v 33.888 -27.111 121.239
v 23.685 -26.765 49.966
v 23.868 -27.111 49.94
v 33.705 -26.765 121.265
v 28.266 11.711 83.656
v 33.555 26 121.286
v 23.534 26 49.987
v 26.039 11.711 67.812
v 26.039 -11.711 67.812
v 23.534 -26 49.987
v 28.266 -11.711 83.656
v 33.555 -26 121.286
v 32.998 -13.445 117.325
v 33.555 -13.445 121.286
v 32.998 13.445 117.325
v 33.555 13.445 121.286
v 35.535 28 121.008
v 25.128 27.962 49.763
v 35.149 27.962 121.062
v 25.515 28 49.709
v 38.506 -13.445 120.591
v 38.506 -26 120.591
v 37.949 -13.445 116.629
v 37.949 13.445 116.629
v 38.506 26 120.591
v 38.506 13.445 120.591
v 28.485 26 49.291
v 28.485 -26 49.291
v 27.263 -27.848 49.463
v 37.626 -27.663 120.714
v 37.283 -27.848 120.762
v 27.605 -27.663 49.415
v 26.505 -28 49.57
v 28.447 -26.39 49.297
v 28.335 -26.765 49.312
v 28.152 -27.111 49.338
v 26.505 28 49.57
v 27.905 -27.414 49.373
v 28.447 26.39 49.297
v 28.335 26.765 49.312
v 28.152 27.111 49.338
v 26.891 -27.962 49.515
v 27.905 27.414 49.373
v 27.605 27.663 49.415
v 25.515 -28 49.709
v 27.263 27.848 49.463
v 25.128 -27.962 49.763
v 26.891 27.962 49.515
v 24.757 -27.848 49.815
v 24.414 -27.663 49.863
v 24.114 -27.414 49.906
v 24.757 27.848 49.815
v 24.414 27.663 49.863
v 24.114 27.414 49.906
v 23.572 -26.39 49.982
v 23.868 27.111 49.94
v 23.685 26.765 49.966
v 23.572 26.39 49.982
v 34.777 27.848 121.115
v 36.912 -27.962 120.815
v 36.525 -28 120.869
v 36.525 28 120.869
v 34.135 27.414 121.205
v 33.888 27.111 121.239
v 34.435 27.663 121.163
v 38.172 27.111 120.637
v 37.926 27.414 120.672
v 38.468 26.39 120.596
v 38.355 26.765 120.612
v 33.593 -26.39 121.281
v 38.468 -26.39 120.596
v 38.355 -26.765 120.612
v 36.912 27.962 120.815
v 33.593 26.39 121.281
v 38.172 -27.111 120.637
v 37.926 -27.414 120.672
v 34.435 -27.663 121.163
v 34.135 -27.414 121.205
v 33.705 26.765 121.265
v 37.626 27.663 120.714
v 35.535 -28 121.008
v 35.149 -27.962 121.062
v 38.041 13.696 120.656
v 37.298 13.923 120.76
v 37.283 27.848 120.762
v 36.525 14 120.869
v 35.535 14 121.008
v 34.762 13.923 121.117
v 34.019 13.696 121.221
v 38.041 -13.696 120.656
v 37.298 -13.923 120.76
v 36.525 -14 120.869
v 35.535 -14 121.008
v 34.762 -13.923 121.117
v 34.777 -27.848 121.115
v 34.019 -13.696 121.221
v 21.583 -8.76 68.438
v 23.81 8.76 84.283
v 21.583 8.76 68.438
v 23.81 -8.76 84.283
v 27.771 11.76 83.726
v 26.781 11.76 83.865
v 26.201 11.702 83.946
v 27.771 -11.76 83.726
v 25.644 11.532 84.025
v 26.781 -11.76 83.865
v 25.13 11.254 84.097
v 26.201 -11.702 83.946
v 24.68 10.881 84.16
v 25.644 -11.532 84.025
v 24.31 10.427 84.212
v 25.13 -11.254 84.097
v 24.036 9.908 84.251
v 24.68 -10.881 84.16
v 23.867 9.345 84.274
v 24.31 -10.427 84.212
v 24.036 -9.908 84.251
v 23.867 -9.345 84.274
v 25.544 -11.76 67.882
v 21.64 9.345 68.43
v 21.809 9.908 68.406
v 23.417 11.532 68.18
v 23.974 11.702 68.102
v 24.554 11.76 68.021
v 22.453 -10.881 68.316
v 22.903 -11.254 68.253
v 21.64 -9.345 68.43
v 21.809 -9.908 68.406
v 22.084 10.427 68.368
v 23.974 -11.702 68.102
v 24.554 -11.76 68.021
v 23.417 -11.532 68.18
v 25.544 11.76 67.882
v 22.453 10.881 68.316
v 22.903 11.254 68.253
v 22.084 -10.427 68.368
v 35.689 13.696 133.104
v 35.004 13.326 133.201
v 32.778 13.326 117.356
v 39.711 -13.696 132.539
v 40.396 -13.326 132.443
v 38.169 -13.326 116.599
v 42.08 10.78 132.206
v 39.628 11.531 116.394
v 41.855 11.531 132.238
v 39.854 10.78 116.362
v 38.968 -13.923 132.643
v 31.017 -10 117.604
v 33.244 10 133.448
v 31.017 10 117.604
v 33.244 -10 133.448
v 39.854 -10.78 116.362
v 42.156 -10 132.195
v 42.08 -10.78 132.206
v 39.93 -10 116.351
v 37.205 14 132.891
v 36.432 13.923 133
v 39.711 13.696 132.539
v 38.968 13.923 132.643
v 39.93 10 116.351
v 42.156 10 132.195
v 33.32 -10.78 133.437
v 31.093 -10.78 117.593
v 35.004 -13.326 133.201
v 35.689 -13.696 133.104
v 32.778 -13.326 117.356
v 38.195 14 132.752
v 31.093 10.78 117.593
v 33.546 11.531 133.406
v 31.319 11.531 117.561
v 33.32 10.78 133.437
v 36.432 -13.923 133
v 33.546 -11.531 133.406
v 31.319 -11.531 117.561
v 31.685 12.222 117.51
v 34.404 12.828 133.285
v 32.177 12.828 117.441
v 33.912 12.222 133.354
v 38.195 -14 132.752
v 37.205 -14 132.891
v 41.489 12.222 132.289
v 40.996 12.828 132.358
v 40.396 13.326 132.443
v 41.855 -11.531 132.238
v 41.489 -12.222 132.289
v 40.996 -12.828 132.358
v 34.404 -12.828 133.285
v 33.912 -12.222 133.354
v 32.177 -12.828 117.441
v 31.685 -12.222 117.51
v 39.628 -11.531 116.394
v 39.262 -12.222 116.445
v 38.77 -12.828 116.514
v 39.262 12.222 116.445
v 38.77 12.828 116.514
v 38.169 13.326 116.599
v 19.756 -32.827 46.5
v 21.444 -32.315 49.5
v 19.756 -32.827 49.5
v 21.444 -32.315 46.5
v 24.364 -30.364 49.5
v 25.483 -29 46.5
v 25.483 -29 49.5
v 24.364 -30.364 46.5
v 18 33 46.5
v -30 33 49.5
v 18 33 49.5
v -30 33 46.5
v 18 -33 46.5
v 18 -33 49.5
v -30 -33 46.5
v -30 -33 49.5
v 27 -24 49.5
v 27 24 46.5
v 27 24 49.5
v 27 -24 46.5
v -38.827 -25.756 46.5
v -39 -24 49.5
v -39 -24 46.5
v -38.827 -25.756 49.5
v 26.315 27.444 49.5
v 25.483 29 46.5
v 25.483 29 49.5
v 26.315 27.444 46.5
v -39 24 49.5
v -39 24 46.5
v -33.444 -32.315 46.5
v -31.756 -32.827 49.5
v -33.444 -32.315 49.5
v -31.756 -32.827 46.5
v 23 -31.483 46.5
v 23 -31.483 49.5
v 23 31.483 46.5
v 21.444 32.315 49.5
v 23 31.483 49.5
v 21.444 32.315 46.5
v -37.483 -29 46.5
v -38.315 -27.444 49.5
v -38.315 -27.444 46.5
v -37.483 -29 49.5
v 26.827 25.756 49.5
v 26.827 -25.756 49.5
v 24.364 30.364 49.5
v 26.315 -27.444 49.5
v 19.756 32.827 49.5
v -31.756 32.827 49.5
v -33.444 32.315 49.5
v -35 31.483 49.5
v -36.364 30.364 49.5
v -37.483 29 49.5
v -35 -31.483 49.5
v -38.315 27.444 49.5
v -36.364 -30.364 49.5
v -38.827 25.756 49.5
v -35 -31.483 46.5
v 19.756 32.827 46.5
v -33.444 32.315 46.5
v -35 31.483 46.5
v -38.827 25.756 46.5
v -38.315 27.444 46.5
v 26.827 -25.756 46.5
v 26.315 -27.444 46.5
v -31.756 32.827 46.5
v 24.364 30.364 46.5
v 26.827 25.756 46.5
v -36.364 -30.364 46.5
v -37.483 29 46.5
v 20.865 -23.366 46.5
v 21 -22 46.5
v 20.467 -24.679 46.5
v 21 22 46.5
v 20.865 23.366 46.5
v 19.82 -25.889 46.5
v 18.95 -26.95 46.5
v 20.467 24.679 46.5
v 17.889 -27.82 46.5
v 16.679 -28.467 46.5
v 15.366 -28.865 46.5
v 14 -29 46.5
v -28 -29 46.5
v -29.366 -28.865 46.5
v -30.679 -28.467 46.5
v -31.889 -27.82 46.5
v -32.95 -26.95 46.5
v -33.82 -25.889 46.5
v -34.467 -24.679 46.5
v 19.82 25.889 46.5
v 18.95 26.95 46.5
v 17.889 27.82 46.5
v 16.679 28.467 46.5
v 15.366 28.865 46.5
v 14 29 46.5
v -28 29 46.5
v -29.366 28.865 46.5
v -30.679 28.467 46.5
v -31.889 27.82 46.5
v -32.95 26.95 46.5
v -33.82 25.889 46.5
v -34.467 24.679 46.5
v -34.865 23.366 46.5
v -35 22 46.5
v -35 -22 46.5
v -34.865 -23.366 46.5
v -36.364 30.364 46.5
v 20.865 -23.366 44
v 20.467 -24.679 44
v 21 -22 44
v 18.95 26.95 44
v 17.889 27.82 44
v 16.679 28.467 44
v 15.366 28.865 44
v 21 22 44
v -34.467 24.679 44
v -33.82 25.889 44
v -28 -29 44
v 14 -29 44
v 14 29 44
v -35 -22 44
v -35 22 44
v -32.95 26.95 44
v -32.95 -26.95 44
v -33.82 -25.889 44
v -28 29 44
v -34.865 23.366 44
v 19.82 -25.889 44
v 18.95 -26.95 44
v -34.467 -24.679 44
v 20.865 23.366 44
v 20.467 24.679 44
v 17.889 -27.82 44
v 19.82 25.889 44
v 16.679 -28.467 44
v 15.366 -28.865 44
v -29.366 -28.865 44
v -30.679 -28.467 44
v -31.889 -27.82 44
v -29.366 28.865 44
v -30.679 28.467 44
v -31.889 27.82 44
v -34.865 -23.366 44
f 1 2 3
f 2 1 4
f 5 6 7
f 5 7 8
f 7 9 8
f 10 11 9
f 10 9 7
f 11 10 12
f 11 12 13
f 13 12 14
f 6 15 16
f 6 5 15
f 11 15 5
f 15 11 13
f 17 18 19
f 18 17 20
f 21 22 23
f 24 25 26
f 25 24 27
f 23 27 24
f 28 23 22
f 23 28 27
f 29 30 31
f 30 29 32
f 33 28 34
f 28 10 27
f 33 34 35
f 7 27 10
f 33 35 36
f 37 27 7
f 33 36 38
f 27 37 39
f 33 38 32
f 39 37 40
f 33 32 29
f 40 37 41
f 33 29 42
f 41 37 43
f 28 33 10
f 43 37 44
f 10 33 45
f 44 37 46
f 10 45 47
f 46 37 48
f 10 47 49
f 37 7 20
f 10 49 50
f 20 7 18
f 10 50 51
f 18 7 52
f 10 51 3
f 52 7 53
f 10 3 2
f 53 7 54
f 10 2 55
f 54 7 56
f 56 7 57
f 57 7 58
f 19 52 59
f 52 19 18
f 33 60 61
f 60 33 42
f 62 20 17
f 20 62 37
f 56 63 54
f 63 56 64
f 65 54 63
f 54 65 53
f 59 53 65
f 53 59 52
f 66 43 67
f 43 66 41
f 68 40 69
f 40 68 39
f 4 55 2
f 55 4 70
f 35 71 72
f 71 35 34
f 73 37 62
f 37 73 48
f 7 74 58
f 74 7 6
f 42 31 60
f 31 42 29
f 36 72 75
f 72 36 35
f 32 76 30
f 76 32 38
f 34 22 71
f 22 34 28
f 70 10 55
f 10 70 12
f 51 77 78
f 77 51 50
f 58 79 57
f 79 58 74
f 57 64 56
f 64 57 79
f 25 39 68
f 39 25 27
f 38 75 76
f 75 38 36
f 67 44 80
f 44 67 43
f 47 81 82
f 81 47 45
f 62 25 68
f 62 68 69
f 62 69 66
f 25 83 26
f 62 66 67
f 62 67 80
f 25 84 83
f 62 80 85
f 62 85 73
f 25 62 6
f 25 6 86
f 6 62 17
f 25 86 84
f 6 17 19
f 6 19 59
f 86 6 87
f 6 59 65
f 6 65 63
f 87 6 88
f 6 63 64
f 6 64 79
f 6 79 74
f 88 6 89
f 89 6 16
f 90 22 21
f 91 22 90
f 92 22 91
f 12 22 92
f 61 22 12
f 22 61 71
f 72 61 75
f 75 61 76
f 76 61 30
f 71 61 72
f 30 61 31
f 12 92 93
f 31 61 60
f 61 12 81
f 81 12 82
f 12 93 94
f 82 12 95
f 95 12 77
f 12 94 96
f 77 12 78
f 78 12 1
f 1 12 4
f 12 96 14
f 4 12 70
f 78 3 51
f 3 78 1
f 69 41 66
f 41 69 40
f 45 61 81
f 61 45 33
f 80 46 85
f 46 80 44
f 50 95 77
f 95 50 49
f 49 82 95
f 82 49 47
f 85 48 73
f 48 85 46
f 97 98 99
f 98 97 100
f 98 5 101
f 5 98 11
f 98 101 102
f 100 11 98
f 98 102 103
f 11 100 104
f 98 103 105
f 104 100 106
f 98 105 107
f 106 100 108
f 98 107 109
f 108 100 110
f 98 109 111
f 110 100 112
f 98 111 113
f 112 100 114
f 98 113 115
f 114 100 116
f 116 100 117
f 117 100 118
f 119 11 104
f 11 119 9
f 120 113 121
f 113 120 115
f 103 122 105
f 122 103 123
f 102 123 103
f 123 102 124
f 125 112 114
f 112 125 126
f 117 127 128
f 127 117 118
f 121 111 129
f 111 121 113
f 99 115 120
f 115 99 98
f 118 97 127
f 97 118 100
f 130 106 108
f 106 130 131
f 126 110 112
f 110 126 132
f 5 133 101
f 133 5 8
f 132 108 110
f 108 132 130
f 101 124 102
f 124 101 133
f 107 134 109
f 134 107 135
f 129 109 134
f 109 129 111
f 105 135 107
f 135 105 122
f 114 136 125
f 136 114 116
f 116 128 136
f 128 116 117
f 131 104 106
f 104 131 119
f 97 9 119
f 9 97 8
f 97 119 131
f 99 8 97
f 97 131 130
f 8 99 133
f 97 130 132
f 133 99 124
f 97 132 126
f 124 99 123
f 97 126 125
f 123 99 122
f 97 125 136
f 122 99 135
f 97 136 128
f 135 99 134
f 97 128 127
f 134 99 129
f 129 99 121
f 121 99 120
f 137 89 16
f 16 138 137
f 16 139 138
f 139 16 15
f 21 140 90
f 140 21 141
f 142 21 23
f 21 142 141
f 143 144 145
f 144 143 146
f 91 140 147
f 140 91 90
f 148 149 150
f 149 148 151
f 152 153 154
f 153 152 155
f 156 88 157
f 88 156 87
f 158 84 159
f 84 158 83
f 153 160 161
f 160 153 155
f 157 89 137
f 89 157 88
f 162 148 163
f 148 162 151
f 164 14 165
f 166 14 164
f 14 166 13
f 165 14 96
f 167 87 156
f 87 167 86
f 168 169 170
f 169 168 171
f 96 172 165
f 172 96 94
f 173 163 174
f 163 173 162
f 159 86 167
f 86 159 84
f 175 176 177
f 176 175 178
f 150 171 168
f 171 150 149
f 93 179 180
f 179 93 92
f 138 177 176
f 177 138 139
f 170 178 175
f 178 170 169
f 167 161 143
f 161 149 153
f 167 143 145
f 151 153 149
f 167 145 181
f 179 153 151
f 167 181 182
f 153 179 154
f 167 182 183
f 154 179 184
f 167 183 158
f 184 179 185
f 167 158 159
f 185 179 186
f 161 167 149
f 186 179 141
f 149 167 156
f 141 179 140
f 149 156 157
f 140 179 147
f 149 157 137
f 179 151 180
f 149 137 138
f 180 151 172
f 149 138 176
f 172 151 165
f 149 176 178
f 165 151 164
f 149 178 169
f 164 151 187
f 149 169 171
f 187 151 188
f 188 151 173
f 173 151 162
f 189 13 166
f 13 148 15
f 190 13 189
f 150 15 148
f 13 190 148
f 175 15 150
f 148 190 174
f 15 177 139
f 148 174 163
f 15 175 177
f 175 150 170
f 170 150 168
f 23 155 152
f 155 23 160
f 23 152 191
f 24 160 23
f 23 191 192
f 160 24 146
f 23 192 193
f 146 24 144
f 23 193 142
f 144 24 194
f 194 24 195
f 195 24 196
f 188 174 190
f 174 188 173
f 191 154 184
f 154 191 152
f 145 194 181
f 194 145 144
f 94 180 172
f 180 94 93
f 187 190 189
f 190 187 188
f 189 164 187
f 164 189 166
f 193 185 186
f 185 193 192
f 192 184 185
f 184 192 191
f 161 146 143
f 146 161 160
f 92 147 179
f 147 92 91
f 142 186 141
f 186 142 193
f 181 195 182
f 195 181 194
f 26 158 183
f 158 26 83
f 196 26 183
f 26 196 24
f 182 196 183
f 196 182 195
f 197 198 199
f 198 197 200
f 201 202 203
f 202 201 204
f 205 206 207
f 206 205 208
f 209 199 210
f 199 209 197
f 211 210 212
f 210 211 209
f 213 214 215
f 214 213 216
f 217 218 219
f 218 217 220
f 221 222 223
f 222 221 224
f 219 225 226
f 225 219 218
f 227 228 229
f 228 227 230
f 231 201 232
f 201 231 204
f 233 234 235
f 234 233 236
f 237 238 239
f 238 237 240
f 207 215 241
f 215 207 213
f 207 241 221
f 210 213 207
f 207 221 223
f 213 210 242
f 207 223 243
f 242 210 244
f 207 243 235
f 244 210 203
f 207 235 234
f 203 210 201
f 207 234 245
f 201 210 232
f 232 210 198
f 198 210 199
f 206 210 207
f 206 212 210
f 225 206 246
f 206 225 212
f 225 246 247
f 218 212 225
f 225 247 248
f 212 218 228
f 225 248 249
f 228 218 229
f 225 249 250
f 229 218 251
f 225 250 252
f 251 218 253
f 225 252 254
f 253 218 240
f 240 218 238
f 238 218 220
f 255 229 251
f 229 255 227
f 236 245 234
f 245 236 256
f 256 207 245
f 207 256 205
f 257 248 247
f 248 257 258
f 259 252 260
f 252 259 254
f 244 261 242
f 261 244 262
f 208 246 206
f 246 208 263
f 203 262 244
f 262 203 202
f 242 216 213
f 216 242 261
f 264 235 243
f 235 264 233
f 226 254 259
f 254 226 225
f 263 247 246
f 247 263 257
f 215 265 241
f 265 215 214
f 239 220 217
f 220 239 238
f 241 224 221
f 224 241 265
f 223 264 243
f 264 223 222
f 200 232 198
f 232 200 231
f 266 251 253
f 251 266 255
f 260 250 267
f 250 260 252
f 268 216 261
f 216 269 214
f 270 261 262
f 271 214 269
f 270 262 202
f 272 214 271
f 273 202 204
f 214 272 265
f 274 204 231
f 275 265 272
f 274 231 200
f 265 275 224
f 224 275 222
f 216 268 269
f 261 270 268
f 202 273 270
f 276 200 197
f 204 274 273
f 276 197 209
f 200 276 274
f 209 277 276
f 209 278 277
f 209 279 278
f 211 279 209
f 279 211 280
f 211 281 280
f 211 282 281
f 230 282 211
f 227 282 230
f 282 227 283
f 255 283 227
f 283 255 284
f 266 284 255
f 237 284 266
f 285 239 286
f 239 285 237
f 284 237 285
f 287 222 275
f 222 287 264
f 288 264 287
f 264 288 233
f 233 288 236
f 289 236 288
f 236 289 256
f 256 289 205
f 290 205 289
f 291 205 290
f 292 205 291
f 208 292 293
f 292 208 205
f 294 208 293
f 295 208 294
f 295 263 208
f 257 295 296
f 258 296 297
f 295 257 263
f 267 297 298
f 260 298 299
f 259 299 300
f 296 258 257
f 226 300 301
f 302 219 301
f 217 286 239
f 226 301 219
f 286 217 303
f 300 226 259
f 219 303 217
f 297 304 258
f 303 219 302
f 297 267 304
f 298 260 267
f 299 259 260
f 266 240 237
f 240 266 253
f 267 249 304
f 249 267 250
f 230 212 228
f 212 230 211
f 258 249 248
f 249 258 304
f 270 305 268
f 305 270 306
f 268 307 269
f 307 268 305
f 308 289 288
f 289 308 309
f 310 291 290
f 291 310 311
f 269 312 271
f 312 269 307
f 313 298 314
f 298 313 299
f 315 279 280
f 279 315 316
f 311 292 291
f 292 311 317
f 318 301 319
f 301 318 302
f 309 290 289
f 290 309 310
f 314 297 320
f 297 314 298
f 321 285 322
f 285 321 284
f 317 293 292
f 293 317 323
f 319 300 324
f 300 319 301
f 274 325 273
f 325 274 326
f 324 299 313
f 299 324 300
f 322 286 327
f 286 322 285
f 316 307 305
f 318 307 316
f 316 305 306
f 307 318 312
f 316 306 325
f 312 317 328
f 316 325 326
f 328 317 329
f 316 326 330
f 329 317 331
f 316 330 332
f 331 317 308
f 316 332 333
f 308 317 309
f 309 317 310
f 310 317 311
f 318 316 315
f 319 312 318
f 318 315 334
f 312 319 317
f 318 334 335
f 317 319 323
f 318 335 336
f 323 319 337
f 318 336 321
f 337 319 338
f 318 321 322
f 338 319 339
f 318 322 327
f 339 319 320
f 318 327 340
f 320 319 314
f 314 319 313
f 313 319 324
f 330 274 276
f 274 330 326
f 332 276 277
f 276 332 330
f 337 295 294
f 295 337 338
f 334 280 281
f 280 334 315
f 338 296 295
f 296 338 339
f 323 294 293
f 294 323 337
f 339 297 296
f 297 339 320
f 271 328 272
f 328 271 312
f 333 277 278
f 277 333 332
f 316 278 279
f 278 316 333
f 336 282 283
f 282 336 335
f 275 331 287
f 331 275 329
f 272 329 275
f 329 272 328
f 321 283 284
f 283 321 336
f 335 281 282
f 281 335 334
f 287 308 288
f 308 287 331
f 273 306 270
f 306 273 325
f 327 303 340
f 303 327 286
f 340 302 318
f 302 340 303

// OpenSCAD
// file: utils.scad
include <parameters.scad>

module beamBetween(p1, p2, width, height) {
    dx = p2[0] - p1[0];
    dz = p2[2] - p1[2];
    length = sqrt(dx * dx + dz * dz);
    angle = atan2(dz, dx);

    translate([(p1[0] + p2[0]) / 2, (p1[1] + p2[1]) / 2, (p1[2] + p2[2]) / 2])
        rotate([0, -angle, 0])
            cube([length, width, height], center = true);
}
// file: seat.scad
include <parameters.scad>
use <utils.scad>

//================ SEAT SUPPORT FRAME (L-BRACKETS) =================//
// Two L-brackets carry the seat. Each one sits on the cross-bar that
// joins the two back drive sprockets. Aluminum construction.
// Suspension beams mount to the outboard side of each bracket riser.

module seatBracket(y, w = 6) {
    panB = idlerZ + seatTopOffset - 5;   // pan bottom
    barX = idlerX;                        // the drive cross-track bar (back sprockets)
    barZ = idlerZ;                        // bar height = sprocket axle height

    // Foot that clamps around the cross-track bar (wraps the axle).
    // Pinch bolt secures the clamp.
    color(matDarkSteel)
        translate([barX, y, barZ])
            rotate([90, 0, 0])
                difference() {
                    cube([12, 10, 14], center = true);
                    cylinder(r = 5.2, h = w + 6, center = true, $fn = 24);
                }
    // Pinch bolt through clamp
    color(matChrome)
        translate([barX, y, barZ + 6])
            cylinder(r = 1.2, h = 16, center = true, $fn = 12);

    // Vertical riser — up from the bar to the pan bottom. Aluminum.
    color(matAluminum)
        translate([barX, y, (barZ + panB) / 2])
            cube([5, w, panB - barZ], center = true);

    // Horizontal arm: out from the riser, under the pan, to the seat.
    armX2 = -30;
    color(matAluminum)
        translate([(barX + armX2) / 2, y, panB - 2])
            cube([barX - armX2, w - 1, 4], center = true);

    // Bolts up into the pan along the horizontal arm.
    for (bx = [20, 8, -6, -18])
        color(matChrome)
            translate([bx, y, panB + 2])
                rotate([0, bx == -18 ? -6 : 0, 0])
                    cylinder(r = 1.5, h = 6, center = true, $fn = 12);
}

//================ BUCKET SEAT =================//
// Aluminum seat with leather cushion:
//  - flat aluminium pan (3mm thick)
//  - leather cushion pad on top
//  - slim aluminium backrest panel with leather pad
//  - aluminium headrest

module roundedRectPlate(w, d, h, r, $fn = 32) {
    hull()
        for (sx = [-1, 1])
            for (sy = [-1, 1])
                translate([sx * (w / 2 - r), sy * (d / 2 - r), 0])
                    cylinder(r = r, h = h, center = true);
}

module bucketSeat() {
    topZ = idlerZ + seatTopOffset;
    backX = idlerX - 14;
    panCX = backX - seatPanLength / 2;
    L = seatPanLength;
    W = seatPanWidth;
    panH = 3;                            // aluminum pan (3mm thick)
    padH = 5;                            // leather cushion thickness
    corner = 9;

    // ---- Seat pan (aluminium plate, rounded corners). ----
    color(matAluminum)
        translate([panCX, 0, topZ - panH / 2])
            roundedRectPlate(L, W, panH, corner);

    // ---- Leather cushion pad (inset seating surface). ----
    color(matLeather)
        translate([panCX - 1, 0, topZ - padH / 2 - 0.5])
            roundedRectPlate(L - 10, W - 8, padH, corner - 2);

    // ---- Backrest panel: aluminium with leather pad. ----
    tilt = seatBackRecline;
    bw = W - 10;
    thick = 3;                          // aluminum (3mm thick)
    bh = backShellHeight;
    translate([backX, 0, topZ])
        rotate([0, tilt, 0]) {
            // main aluminium panel
            color(matAluminum)
                translate([-1, 0, bh / 2])
                    roundedRectPlate(thick, bw, bh, 2);

            // leather lumbar pad (lower back)
            color(matLeather)
                translate([-4.5, 0, 26])
                    roundedRectPlate(7, bw * 0.42, 16, 3);

            // headrest (aluminium)
            color(matAluminum)
                translate([-1, 0, bh + headrestHeight / 2 - 4])
                    roundedRectPlate(thick + 4, bw * 0.5, headrestHeight, 4);
        }
}
// file: parameters.scad
// Shared parameters for tracked wheelchair prototype
// NOTE: 1 unit = 1 cm (seat target 450 mm = 45 units above ground).
$fn = 48;

//================ MATERIALS =================//
// Frame: aluminum 6061-T6 (lightweight)
// Seat: carbon fiber T700 + honeycomb (ultralight)
// Suspension: rubber bushings (lightweight)
// Axles: aluminum 7075-T6 (1/3 weight of steel)
matSteel      = [0.35, 0.36, 0.38];   // hardware / fasteners only
matDarkSteel  = [0.25, 0.26, 0.28];
matRubber     = [0.12, 0.12, 0.14];   // track belt + bushings
matAluminum   = [0.55, 0.57, 0.60];   // primary frame material
matChrome     = [0.70, 0.72, 0.75];
matCarbon     = [0.15, 0.15, 0.18];   // (unused — seat now aluminum)
matLeather    = [0.45, 0.25, 0.12];   // leather cushion color

//================ TRACKS =================//
trackLength = 82;
trackWidth = 14;
trackCenterY = 28;

idlerRadius = 10;
idlerX = trackLength / 2;
idlerZ = 16;
roadRadius = 7;
roadZ = 13;  // road wheels roll on the belt's inner surface (belt upper edge at this height)
roadPositions = [-22, -6, 10, 24];

linkLength = 10;
linkWidth = trackWidth + 2;
linkThickness = 3;
linkGap = 1;
// Belt centerline clears the idler wheels plus link half-thickness,
// so the links ride on the wheels instead of clipping through them.
trackRadius = idlerRadius + linkThickness / 2;  // = 11.5
beltThickness = 3;
groundZ = idlerZ - trackRadius;  // bottom of track = ground level (4.5)

//================ HYDRAULIC JACK WHEEL =================//
trackTilt = 0;
liftPivotX = idlerX;
liftPivotZ = idlerZ;
// Electric linear actuator (24V DC, 500kg, 300mm stroke).
// 1/3 weight of hydraulic system.
hydrWheelRadius = 4;
hydrWheelWidth = 10;
hydrBarrelRadius = 4;        // smaller barrel (mini actuator)
hydrBarrelHeight = 12;       // shorter barrel
hydrRodRadius = 2;
// At full extension the jack wheel rests on the ground:
// mountZ 35 - groundZ 4.5 - wheelR 4 = 26.5
hydrExtend = 26.5;
hydrRetracted = 0;
hydrExtendAmount = hydrExtend;
hydrMountX = 10;   // jack mount x; moved forward (from 24) for first-stair clearance
hydrMountY = 0;

//================ CHASSIS =================//
chassisLength = 82;
chassisBottom = 35;
chassisHeight = 12;

//================ SEAT =================//
// Seat geometry: flat aluminium pan + leather cushion + slim backrest.
// Seat surface rides at 450 mm (45 units) above the ground.
// topZ = idlerZ + seatTopOffset = 49.5, ground at 4.5 -> seat 45 above ground.
seatPanLength = 66;
seatPanWidth = 66;
backShellHeight = 72;
headrestHeight = 16;
seatTopOffset = 45 - trackRadius;  // = 33.5
// Backrest recline (deg from vertical).
seatBackRecline = 8;

//================ FOOTREST =================//
footrestWidth = 34;
footrestLength = 28;
footrestThickness = 3;       // 3mm aluminum plate
footrestHeight = idlerZ + 12;
footrestFrontX = -30 - footrestLength / 2;  // plate center, extends forward from arm end

// Folding footplate pivots at the end of the L-bracket arm.
footPivotX = -30;                           // end of L-bracket horizontal arm
footPivotZ = idlerZ + seatTopOffset - 7;    // arm height (panB - 2)
footHeelGuard = true;                       // optional heel guard
footToeGuard = false;                       // optional toe guard (off by default)

//================ ARMRESTS =================//
armPivotX = idlerX - 14;                     // rear post at the seat back
armLength = 68;                              // full-length pad (covers seat depth)
armPadHeight = idlerZ + seatTopOffset + 19;  // pad top = elbow height (~19 above seat top)
armPadWidth = 8;
armPadThick = 4;
// main file
// STL EXPORT: Bucket seat (pan + cushion + backrest + headrest)
include <parameters.scad>
use <seat.scad>
bucketSeat();
